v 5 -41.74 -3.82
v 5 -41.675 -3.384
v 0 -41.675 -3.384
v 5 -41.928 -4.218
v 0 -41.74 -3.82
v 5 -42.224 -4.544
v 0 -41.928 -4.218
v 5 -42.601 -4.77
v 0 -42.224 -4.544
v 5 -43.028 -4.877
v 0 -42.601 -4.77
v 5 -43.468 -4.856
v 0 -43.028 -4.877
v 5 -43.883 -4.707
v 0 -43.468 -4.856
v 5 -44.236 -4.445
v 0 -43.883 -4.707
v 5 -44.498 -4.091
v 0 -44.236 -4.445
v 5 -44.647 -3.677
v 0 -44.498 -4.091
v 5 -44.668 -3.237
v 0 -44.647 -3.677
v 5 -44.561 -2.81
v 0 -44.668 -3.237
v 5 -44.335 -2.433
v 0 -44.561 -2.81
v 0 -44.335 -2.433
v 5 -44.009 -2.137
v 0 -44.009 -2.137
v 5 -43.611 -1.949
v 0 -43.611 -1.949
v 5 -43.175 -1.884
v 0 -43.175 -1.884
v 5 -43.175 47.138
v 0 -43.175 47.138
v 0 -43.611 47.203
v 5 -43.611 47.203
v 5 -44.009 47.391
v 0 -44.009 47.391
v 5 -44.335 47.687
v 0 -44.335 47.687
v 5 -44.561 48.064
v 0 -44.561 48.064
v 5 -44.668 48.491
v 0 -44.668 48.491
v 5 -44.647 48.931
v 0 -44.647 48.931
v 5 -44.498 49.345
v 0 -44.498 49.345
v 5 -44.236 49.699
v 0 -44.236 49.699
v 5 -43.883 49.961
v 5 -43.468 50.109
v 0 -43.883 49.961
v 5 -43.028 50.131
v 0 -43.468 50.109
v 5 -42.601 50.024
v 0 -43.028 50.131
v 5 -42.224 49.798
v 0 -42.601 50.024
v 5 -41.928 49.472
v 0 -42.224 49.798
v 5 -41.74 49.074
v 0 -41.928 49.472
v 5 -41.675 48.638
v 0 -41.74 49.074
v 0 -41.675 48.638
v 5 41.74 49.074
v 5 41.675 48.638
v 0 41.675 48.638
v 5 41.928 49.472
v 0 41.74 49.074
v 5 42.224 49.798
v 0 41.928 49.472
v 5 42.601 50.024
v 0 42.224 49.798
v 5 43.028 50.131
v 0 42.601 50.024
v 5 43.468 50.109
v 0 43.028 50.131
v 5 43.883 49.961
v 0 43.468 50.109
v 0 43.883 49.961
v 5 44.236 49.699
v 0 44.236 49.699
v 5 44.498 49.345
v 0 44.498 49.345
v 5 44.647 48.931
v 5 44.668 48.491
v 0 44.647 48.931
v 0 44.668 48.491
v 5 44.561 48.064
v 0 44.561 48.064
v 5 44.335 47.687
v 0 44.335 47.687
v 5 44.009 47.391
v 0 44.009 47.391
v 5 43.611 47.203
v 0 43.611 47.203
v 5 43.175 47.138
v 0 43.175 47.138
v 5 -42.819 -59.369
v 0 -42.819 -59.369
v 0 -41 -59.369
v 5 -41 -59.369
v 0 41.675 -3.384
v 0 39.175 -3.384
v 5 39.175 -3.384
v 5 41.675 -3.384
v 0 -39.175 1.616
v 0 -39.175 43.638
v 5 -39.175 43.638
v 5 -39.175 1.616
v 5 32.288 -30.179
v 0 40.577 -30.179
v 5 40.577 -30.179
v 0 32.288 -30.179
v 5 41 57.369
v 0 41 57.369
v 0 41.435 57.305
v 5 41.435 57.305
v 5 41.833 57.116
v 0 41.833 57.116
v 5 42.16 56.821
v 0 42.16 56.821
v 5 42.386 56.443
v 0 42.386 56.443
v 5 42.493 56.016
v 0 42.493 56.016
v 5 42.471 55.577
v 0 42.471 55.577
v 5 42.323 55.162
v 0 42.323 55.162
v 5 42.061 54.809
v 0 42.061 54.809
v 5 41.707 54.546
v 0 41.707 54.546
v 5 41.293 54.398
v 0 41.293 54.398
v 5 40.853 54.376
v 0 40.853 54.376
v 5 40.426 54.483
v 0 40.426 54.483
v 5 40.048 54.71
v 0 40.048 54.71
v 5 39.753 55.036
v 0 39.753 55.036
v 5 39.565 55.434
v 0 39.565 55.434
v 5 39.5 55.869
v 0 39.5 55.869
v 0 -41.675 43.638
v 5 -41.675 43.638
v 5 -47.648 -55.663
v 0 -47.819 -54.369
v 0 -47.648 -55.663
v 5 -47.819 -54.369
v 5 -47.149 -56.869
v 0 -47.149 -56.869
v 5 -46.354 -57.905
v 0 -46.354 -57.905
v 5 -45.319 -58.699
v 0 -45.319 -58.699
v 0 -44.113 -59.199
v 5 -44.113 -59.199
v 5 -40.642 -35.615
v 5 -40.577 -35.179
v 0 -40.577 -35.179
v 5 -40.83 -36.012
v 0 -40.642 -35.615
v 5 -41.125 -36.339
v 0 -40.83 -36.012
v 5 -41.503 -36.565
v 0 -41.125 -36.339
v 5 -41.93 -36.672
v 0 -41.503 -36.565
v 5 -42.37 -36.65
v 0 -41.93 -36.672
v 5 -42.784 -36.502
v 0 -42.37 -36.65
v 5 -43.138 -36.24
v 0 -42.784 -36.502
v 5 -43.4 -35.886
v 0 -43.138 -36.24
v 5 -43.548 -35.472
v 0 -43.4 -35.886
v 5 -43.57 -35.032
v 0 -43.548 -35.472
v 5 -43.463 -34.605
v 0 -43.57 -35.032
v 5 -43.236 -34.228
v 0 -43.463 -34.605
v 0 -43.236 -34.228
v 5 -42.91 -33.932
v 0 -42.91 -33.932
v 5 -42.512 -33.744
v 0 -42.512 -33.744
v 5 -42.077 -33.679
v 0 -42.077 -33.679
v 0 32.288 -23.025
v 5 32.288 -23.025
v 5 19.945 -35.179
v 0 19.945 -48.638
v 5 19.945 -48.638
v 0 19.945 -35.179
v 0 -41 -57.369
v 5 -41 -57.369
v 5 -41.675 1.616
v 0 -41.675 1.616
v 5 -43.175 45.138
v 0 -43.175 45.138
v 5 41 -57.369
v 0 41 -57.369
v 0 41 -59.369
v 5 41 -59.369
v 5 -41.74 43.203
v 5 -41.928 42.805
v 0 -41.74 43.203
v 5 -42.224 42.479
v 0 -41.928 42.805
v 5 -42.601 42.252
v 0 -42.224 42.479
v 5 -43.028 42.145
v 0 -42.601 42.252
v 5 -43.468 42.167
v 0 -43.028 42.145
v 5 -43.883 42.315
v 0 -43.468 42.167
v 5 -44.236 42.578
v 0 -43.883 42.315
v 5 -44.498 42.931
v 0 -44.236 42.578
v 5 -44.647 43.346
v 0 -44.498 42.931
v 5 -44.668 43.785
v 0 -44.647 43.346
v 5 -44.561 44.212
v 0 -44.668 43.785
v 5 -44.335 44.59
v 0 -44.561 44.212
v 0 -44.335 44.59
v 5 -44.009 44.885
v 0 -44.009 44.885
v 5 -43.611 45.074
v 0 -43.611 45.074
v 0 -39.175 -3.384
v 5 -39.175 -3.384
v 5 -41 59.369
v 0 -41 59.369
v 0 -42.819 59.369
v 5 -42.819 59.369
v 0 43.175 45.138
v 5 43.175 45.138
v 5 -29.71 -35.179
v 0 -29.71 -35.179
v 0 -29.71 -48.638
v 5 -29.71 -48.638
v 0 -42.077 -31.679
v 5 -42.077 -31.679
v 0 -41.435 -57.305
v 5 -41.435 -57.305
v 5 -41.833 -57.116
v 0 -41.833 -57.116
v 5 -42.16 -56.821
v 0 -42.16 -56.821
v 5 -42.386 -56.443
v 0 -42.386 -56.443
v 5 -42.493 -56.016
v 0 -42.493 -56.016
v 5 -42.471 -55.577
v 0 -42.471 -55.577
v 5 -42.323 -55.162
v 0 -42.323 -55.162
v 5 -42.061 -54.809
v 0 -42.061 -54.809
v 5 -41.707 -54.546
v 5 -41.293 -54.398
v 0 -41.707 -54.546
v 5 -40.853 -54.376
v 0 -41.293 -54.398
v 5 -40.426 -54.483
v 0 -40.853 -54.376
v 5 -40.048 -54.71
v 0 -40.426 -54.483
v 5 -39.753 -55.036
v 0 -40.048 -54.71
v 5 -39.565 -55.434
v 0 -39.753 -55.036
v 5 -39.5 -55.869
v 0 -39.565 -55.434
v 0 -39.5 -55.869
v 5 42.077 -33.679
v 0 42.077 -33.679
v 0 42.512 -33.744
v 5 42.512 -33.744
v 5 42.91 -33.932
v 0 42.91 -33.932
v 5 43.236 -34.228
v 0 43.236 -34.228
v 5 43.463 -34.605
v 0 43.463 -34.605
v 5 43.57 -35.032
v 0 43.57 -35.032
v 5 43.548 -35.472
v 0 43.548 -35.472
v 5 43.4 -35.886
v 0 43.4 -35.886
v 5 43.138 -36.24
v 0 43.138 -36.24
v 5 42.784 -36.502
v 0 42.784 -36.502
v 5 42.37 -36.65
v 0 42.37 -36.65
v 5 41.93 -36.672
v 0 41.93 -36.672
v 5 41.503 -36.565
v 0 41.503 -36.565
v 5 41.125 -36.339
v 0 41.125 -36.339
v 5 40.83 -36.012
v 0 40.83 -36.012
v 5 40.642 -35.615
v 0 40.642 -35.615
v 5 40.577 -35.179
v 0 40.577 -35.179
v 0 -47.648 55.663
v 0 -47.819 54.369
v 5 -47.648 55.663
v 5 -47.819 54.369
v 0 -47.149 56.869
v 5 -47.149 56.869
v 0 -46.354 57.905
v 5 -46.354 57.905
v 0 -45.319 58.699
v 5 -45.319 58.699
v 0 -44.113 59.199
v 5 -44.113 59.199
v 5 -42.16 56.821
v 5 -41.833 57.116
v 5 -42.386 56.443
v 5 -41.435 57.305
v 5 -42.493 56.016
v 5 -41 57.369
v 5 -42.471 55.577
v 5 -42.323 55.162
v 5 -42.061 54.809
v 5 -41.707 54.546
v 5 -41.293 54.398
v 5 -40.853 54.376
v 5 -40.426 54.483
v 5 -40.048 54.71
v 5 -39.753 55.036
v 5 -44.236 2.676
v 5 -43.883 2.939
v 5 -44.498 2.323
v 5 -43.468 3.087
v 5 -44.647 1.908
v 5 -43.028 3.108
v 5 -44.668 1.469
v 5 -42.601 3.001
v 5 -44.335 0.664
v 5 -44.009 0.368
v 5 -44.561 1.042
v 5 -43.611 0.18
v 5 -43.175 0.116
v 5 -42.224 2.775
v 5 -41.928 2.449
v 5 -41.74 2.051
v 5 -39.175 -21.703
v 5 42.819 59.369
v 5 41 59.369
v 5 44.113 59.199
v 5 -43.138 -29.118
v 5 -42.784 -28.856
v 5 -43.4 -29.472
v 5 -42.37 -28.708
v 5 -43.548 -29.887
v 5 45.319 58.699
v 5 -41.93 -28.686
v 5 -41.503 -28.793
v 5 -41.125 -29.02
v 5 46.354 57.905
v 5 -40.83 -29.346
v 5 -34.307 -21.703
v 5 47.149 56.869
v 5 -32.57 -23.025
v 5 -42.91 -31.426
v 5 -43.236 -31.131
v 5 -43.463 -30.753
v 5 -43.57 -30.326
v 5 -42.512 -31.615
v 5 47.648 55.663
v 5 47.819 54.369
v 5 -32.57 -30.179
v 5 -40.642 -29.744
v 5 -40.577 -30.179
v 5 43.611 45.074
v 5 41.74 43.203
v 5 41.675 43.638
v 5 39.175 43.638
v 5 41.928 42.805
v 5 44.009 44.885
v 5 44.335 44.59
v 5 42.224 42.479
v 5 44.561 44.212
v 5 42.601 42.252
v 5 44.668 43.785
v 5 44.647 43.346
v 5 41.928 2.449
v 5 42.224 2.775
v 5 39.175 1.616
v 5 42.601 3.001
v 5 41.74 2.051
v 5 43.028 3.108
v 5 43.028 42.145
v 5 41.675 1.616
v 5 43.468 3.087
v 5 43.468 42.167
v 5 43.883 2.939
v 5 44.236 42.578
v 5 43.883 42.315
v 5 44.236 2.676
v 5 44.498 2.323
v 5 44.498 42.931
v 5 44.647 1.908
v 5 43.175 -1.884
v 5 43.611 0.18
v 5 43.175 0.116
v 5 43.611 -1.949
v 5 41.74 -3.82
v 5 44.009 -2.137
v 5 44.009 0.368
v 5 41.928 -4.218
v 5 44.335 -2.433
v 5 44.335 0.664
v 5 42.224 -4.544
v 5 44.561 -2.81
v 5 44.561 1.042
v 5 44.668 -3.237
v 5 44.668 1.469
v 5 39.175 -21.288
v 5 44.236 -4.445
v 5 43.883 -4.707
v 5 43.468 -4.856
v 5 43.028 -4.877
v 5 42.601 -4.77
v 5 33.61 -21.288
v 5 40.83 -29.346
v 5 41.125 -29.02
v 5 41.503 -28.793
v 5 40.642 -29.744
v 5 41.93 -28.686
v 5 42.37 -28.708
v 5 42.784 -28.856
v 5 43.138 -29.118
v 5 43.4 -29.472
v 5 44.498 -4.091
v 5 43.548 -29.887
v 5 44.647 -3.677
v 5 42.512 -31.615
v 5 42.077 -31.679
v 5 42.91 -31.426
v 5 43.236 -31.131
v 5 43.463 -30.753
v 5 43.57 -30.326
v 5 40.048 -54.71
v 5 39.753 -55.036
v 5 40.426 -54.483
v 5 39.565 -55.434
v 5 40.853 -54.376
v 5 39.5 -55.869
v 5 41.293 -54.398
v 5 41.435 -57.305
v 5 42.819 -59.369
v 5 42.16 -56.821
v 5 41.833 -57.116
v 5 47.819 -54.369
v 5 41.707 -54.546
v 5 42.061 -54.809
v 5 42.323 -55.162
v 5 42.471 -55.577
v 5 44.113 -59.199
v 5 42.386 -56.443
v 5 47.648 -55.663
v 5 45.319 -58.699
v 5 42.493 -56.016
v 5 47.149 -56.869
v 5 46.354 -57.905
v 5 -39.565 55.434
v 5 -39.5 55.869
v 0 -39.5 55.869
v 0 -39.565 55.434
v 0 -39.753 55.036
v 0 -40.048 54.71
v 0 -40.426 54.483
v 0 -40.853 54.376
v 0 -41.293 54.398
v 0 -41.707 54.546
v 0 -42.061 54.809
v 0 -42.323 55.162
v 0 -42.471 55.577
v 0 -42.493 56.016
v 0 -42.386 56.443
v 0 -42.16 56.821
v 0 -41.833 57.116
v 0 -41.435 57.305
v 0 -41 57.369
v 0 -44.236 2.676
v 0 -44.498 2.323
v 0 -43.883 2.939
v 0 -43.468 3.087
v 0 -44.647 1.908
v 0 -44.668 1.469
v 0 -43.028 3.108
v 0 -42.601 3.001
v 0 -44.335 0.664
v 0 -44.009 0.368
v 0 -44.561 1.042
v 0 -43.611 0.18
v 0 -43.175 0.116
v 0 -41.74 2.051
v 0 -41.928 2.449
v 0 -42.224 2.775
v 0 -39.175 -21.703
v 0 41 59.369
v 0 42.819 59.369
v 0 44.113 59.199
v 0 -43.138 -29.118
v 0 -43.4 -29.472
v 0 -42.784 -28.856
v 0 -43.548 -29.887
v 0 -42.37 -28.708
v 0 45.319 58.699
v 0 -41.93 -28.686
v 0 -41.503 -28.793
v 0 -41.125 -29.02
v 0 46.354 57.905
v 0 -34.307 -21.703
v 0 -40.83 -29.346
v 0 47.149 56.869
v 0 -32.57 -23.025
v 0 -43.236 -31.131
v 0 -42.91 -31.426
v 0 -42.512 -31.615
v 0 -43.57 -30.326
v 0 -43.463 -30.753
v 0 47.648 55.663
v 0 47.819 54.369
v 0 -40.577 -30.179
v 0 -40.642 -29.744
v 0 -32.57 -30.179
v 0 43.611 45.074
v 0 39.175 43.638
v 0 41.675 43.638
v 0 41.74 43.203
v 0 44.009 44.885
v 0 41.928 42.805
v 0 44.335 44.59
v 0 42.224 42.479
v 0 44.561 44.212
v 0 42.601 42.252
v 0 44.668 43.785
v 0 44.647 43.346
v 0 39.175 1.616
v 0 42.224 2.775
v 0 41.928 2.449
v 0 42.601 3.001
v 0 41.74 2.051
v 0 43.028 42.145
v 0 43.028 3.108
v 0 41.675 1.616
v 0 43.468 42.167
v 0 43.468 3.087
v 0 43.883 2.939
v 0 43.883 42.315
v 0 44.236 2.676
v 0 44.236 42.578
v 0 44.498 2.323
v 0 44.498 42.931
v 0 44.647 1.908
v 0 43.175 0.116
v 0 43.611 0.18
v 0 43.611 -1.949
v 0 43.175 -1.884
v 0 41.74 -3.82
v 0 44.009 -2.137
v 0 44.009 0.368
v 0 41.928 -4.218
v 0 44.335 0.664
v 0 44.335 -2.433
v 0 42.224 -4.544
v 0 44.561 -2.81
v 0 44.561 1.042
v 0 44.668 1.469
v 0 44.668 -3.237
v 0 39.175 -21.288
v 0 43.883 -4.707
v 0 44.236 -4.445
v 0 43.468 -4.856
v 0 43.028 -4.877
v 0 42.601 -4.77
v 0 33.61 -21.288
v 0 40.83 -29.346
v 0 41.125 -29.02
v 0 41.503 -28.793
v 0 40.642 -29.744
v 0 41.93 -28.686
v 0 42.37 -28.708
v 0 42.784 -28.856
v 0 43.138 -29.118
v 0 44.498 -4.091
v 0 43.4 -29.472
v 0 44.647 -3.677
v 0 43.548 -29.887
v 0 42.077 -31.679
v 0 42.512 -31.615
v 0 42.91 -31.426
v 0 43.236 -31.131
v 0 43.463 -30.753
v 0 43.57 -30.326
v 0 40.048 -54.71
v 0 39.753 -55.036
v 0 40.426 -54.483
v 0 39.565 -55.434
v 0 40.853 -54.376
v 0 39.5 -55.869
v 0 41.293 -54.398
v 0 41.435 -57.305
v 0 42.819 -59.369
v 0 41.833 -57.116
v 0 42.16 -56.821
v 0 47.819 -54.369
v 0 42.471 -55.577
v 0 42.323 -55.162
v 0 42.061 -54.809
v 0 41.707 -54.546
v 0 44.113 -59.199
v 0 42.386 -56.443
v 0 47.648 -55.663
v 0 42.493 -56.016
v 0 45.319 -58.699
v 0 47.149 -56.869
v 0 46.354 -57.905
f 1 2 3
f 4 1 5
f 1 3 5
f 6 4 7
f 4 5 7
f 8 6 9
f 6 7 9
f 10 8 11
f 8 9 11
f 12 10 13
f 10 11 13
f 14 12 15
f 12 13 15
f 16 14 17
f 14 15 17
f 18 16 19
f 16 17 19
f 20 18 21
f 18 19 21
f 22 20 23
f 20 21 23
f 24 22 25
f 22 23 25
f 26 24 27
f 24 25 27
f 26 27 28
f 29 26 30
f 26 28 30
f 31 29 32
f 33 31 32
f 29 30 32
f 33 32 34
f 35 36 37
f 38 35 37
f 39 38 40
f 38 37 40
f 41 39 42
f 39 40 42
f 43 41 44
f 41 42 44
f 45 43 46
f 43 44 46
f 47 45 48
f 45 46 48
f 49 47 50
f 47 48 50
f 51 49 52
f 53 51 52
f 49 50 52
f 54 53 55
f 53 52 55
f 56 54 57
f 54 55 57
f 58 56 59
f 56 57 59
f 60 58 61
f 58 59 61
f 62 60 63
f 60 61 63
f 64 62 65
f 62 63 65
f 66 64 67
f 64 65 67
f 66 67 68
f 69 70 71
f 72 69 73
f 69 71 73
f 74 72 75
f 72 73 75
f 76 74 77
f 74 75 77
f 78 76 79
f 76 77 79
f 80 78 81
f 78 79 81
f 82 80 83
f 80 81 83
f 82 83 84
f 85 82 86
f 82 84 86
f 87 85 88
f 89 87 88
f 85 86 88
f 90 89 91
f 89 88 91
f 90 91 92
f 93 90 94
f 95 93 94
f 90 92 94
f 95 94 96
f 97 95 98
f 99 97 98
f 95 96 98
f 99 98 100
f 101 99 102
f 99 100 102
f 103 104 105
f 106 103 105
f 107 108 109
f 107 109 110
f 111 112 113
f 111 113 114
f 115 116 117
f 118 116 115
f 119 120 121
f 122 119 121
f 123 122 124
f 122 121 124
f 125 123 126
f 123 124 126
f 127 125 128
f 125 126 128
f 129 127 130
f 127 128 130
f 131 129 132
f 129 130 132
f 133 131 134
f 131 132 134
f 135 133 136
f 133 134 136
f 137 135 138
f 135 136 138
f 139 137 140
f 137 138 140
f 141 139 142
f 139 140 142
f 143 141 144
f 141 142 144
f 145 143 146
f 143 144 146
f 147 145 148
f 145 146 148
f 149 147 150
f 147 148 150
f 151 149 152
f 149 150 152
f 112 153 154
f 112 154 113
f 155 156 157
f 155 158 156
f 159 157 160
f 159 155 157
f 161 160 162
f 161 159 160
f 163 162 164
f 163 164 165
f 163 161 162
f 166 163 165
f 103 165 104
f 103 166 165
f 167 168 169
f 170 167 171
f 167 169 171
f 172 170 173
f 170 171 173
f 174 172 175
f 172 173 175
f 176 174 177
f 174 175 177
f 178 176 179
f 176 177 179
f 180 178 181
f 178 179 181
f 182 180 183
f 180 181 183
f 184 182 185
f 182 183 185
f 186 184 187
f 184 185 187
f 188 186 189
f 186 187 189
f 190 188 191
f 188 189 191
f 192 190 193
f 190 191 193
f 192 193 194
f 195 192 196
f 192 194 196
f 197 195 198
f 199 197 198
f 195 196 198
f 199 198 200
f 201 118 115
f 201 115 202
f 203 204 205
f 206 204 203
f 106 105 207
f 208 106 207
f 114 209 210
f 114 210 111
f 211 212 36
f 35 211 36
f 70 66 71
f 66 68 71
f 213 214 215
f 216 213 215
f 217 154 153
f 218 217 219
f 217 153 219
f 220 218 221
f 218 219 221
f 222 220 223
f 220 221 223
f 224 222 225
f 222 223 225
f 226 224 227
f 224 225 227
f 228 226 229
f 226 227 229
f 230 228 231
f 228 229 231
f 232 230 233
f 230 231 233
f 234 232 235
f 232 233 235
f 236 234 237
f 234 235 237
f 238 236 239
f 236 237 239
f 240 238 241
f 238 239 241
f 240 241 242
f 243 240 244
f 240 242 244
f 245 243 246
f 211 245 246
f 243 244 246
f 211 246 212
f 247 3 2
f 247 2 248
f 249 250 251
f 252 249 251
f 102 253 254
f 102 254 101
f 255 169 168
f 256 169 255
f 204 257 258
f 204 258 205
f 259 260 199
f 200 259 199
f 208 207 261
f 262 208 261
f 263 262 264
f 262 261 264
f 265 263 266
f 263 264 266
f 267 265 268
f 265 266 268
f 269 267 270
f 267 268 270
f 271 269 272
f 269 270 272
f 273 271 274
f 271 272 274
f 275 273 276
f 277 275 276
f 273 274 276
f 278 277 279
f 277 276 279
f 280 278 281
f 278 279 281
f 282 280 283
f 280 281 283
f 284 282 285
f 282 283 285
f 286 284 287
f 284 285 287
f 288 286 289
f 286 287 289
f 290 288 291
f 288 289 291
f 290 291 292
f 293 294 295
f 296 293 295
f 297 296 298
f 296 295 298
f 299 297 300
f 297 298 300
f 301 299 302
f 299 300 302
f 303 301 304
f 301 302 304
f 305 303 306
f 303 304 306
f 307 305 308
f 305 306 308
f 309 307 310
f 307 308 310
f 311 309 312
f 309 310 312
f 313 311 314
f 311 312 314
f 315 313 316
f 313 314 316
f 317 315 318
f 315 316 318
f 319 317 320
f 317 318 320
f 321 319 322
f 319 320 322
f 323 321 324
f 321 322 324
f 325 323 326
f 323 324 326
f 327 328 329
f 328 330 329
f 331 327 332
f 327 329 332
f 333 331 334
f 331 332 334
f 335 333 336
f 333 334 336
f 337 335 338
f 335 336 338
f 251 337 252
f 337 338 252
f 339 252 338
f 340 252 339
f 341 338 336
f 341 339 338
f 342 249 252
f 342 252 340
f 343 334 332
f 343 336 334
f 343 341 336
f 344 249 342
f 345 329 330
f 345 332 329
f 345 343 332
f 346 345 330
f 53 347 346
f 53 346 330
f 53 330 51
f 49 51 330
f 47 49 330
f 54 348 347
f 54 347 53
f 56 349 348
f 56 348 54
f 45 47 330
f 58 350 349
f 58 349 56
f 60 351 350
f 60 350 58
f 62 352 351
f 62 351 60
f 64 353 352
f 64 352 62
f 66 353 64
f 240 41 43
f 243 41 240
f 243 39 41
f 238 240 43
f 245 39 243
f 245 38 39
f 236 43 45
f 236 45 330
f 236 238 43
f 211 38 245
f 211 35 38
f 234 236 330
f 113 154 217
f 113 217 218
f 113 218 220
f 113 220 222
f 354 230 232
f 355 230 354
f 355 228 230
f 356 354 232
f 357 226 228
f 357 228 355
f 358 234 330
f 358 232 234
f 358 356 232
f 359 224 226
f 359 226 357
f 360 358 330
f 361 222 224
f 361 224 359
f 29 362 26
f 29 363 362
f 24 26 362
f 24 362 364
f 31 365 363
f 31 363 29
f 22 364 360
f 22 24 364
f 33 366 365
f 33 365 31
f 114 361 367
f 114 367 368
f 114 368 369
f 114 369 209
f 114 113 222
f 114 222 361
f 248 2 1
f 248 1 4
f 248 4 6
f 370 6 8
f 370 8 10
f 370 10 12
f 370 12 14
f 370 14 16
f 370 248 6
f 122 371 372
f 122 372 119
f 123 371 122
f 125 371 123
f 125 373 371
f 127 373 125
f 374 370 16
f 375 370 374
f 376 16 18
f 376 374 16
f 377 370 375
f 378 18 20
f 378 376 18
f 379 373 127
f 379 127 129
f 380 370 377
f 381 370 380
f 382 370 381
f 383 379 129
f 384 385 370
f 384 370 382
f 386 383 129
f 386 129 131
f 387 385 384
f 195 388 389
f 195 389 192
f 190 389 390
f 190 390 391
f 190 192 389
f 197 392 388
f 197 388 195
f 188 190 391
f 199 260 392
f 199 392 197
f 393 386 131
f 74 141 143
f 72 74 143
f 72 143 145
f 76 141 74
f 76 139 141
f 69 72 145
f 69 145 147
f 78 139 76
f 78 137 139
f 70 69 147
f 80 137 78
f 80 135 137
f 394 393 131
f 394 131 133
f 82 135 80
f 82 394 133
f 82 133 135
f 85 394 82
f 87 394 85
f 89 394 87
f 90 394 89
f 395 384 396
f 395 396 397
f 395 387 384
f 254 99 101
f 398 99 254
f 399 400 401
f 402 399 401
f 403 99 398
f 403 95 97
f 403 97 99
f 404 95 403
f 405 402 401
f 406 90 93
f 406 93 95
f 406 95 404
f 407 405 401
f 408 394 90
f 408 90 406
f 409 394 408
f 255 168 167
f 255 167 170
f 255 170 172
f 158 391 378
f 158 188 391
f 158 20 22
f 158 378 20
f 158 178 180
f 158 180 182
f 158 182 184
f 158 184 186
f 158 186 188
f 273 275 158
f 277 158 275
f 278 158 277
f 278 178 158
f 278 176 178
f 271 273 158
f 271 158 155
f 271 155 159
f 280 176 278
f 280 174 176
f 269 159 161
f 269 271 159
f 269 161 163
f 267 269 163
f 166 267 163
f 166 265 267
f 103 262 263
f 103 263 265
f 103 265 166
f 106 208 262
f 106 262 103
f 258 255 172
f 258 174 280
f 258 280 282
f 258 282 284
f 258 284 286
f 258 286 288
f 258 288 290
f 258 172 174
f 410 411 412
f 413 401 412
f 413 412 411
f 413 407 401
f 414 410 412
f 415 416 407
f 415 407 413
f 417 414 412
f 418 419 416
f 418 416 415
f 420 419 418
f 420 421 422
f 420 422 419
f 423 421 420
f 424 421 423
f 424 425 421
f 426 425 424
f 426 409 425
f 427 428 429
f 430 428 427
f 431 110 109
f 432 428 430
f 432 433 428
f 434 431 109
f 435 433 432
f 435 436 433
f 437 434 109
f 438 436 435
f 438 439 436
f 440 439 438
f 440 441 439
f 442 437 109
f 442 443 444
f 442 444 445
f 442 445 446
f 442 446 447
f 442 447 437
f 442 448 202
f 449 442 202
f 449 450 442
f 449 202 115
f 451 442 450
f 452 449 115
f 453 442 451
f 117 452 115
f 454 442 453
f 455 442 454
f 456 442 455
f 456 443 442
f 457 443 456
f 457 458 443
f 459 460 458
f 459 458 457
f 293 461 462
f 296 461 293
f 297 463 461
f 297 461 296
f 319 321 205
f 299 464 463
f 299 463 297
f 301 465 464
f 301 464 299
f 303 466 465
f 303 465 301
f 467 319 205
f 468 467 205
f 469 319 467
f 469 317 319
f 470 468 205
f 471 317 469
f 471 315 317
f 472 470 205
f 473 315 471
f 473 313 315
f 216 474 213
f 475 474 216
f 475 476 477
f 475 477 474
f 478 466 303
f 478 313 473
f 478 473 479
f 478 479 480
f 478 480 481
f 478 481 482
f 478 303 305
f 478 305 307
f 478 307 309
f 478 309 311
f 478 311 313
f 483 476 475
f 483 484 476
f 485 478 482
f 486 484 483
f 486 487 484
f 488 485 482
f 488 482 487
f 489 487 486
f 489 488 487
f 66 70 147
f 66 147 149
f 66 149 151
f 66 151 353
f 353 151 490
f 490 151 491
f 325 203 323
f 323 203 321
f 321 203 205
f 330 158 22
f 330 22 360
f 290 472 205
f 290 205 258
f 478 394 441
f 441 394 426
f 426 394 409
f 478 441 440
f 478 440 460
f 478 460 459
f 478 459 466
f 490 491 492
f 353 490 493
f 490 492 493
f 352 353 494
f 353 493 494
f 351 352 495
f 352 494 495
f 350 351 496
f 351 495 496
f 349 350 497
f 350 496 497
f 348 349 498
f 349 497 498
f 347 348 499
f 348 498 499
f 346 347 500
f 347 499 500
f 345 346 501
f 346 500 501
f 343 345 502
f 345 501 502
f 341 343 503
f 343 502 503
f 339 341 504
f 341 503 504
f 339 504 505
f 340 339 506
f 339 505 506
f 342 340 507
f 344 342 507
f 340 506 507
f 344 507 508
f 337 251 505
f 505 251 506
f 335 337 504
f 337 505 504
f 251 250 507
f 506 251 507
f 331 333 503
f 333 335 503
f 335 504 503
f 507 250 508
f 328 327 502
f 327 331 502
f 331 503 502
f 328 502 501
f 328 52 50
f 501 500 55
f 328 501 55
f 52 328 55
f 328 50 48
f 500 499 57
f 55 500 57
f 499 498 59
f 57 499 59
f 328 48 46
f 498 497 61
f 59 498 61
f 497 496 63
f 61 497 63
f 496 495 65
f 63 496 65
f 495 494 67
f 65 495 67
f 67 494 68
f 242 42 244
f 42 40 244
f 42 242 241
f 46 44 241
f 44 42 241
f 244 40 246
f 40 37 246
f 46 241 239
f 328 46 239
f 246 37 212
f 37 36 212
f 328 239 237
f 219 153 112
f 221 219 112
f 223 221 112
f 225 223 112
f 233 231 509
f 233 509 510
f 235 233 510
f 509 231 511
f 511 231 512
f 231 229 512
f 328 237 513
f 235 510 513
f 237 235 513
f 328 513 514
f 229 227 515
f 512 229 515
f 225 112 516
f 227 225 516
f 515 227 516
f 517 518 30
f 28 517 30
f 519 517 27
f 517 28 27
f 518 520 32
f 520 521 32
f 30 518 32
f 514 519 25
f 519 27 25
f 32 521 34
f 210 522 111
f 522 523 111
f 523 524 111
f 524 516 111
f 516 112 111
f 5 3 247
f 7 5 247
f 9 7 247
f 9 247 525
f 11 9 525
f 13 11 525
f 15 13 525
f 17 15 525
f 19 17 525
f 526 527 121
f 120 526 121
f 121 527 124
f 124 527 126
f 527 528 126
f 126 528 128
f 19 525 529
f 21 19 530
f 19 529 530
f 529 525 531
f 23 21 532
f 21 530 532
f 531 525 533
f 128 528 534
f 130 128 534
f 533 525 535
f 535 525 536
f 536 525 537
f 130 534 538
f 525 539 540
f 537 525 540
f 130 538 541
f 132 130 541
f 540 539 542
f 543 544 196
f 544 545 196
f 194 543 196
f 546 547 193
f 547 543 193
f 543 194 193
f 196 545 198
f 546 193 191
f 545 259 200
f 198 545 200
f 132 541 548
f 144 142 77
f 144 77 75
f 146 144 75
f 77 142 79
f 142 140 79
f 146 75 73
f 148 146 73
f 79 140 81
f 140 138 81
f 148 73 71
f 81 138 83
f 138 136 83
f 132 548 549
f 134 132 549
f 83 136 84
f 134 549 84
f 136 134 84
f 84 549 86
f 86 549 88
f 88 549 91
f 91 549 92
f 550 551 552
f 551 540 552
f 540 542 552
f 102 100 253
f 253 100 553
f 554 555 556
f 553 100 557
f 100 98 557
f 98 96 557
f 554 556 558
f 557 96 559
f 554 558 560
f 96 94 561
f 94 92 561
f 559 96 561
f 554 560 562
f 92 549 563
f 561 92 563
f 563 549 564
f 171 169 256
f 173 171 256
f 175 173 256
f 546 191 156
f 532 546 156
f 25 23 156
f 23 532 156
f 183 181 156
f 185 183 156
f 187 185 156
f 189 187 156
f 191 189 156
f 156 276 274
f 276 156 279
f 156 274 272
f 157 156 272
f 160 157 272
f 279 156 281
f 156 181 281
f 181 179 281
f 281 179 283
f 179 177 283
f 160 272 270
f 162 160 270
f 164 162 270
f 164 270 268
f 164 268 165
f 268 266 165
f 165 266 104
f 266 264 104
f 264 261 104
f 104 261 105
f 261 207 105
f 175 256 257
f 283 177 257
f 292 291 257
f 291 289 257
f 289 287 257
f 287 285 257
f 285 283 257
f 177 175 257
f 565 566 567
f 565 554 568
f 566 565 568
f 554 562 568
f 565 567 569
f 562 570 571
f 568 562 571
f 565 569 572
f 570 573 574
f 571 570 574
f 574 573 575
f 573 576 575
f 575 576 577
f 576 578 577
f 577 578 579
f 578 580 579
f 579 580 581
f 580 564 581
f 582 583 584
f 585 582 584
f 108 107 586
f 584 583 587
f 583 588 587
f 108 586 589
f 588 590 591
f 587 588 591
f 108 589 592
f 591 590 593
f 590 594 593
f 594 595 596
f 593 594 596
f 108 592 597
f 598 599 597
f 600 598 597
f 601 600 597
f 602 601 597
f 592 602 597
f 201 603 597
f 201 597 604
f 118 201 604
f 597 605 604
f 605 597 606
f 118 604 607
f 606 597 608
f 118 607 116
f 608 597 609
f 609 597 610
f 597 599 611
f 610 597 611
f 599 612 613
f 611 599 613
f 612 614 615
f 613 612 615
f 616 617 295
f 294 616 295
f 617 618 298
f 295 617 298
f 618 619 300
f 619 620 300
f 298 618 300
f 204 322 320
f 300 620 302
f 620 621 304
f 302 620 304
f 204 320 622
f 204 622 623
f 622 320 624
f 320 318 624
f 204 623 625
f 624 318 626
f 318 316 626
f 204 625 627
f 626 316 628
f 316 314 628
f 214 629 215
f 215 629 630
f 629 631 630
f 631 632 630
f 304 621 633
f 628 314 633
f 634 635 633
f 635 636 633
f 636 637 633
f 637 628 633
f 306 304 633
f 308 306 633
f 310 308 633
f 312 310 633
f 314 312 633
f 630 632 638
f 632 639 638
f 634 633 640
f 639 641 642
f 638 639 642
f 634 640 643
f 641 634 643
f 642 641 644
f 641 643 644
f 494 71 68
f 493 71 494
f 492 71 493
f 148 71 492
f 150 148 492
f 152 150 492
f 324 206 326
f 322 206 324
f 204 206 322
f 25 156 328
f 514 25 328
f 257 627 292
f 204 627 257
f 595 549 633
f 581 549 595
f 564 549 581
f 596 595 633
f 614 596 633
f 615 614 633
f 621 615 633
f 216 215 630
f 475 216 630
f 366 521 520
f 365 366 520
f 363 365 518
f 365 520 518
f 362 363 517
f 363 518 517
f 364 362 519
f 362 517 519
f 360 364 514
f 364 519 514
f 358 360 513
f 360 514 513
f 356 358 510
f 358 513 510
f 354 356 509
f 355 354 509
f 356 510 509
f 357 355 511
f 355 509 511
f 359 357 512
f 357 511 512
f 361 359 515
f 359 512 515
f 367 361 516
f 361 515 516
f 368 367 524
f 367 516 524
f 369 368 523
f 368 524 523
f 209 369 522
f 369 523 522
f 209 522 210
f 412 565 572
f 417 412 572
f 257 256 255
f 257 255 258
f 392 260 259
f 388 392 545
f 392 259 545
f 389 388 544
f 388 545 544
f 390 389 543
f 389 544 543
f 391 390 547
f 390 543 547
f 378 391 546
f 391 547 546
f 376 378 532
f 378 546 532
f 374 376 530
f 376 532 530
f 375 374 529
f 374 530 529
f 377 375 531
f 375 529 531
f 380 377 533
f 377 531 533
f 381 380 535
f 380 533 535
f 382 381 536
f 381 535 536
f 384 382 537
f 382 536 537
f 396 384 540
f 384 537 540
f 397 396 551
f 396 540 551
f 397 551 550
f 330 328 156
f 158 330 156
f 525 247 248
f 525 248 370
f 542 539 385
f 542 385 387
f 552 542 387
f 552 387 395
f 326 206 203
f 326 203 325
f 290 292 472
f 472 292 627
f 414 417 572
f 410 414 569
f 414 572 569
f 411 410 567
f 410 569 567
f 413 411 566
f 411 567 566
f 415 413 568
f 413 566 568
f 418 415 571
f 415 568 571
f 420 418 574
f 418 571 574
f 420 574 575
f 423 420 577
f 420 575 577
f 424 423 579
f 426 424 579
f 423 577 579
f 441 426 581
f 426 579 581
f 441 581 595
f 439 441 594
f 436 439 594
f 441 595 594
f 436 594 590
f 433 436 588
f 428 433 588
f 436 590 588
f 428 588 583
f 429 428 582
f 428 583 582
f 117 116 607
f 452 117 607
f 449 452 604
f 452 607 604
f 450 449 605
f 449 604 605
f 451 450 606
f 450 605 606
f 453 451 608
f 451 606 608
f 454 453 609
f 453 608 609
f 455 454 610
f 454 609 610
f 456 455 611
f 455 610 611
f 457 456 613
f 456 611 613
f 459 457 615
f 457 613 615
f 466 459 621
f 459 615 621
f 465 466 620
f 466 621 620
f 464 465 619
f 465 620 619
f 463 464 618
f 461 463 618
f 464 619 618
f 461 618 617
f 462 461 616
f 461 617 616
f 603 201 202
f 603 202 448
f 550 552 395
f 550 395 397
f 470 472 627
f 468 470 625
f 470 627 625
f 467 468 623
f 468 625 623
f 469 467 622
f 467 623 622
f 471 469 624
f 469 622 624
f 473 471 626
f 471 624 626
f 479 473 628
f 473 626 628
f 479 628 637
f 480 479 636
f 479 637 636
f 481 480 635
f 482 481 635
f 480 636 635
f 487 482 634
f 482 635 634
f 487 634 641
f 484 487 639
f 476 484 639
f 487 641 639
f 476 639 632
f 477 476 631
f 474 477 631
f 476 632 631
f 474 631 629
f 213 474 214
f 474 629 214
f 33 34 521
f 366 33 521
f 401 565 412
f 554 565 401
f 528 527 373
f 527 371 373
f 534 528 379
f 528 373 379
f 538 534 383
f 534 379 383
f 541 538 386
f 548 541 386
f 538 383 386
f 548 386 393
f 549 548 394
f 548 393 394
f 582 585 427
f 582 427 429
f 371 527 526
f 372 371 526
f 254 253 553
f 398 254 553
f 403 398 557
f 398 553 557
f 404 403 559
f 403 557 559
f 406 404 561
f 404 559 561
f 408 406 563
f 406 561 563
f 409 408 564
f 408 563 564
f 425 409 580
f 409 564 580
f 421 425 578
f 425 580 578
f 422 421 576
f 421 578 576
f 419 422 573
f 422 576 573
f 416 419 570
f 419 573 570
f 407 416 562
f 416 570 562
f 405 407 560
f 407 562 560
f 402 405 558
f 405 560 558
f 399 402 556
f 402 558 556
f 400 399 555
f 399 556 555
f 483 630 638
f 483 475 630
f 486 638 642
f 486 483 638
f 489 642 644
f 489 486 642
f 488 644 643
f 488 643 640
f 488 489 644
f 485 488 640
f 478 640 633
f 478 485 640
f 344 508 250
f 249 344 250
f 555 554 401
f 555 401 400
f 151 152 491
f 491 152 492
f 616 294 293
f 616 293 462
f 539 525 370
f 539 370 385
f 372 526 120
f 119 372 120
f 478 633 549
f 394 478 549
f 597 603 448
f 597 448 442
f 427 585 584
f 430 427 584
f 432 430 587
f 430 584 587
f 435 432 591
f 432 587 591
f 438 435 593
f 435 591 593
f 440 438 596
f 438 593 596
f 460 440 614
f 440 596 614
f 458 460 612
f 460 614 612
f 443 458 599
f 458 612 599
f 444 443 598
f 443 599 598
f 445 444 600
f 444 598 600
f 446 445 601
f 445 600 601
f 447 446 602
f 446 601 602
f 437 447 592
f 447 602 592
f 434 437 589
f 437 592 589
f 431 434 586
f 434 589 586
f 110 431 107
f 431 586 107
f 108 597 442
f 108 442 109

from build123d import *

# Parameters (mm, degrees)
BOSS_EXTRUDE1_DEPTH = 5
FILLET1_R           = 5
CUT_EXTRUDE1_REACH  = 7
SKETCH2_W           = 5
SKETCH2_H           = 4
CUT_EXTRUDE2_REACH  = 7
SKETCH3_R           = 1.5


with BuildPart() as part:
    # Sketch1 → Boss-Extrude1 (new body)
    with BuildSketch(Plane(origin=(0, 0, 0), x_dir=(0, 0, -1), z_dir=(1, 0, 0))):
        Polygon((-59.36916415, -47.818646587), (0, -47.818646587), (59.36916415, -47.818646587), (59.36916415, -41), (55.86916415, -41), (55.86916415, 41), (59.36916415, 41), (59.36916415, 47.818646587), (-59.36916415, 47.818646587), (-59.36916415, 41), (-55.86916415, 41), (-55.86916415, -41), (-59.36916415, -41), align=None)
        Polygon((21.702610628, -39.175443067), (21.702610628, -34.307045578), (23.024909313, -32.569779859), (30.179141539, -32.569779859), (30.179141539, -42.076978078), (35.179141539, -42.076978078), (35.179141539, -29.710380013), (48.63820865, -29.710380013), (48.63820865, 19.945173818), (35.179141539, 19.945173818), (35.179141539, 42.076978078), (30.179141539, 42.076978078), (30.179141539, 32.288188968), (23.024909313, 32.288188968), (21.287643594, 33.610487654), (21.287643594, 39.175443067), (-48.63820865, 39.175443067), (-48.63820865, -39.175443067), align=None, mode=Mode.SUBTRACT)
    extrude(amount=BOSS_EXTRUDE1_DEPTH)

    # Fillet1
    fillet1_edges = [part.edges().sort_by_distance(p)[0] for p in [
        (2.5, -47.818646587, -59.36916415),
        (2.5, -47.818646587, 59.36916415),
        (2.5, 47.818646587, 59.36916415),
        (2.5, 47.818646587, -59.36916415),
    ]]
    fillet(fillet1_edges, radius=FILLET1_R)

    # Sketch2 → Cut-Extrude1 (cut, up to next)
    with BuildSketch(Plane.ZY, mode=Mode.PRIVATE) as cut_extrude1_sk1:
        with Locations((46.13820865, 41.175443067)):
            Rectangle(SKETCH2_W, SKETCH2_H)
    cut_extrude1_tool1 = extrude(cut_extrude1_sk1.sketch, amount=-CUT_EXTRUDE1_REACH, mode=Mode.PRIVATE) & part.part
    add(cut_extrude1_tool1.solids().sort_by_distance((0, 41.175443, 46.138209))[0], mode=Mode.SUBTRACT)
    # Sketch2 → Cut-Extrude1 (cut, up to next)
    with BuildSketch(Plane.ZY, mode=Mode.PRIVATE) as cut_extrude1_sk2:
        with Locations((46.13820865, -41.175443067)):
            Rectangle(SKETCH2_W, SKETCH2_H)
    cut_extrude1_tool2 = extrude(cut_extrude1_sk2.sketch, amount=-CUT_EXTRUDE1_REACH, mode=Mode.PRIVATE) & part.part
    add(cut_extrude1_tool2.solids().sort_by_distance((0, -41.175443, 46.138209))[0], mode=Mode.SUBTRACT)
    # Sketch2 → Cut-Extrude1 (cut, up to next)
    with BuildSketch(Plane.ZY, mode=Mode.PRIVATE) as cut_extrude1_sk3:
        with Locations((-0.884341096, -41.175443067)):
            Rectangle(SKETCH2_W, SKETCH2_H)
    cut_extrude1_tool3 = extrude(cut_extrude1_sk3.sketch, amount=-CUT_EXTRUDE1_REACH, mode=Mode.PRIVATE) & part.part
    add(cut_extrude1_tool3.solids().sort_by_distance((0, -41.175443, -0.884341))[0], mode=Mode.SUBTRACT)
    # Sketch2 → Cut-Extrude1 (cut, up to next)
    with BuildSketch(Plane.ZY, mode=Mode.PRIVATE) as cut_extrude1_sk4:
        with Locations((-0.884341096, 41.175443067)):
            Rectangle(SKETCH2_W, SKETCH2_H)
    cut_extrude1_tool4 = extrude(cut_extrude1_sk4.sketch, amount=-CUT_EXTRUDE1_REACH, mode=Mode.PRIVATE) & part.part
    add(cut_extrude1_tool4.solids().sort_by_distance((0, 41.175443, -0.884341))[0], mode=Mode.SUBTRACT)

    # Sketch3 → Cut-Extrude2 (cut, up to next)
    with BuildSketch(Plane.ZY, mode=Mode.PRIVATE) as cut_extrude2_sk1:
        with Locations((-35.179141539, 42.076978078)):
            Circle(SKETCH3_R)
    cut_extrude2_tool1 = extrude(cut_extrude2_sk1.sketch, amount=-CUT_EXTRUDE2_REACH, mode=Mode.PRIVATE) & part.part
    add(cut_extrude2_tool1.solids().sort_by_distance((0, 42.076978, -35.179142))[0], mode=Mode.SUBTRACT)
    # Sketch3 → Cut-Extrude2 (cut, up to next)
    with BuildSketch(Plane.ZY, mode=Mode.PRIVATE) as cut_extrude2_sk2:
        with Locations((-30.179141539, 42.076978078)):
            Circle(SKETCH3_R)
    cut_extrude2_tool2 = extrude(cut_extrude2_sk2.sketch, amount=-CUT_EXTRUDE2_REACH, mode=Mode.PRIVATE) & part.part
    add(cut_extrude2_tool2.solids().sort_by_distance((0, 42.076978, -30.179142))[0], mode=Mode.SUBTRACT)
    # Sketch3 → Cut-Extrude2 (cut, up to next)
    with BuildSketch(Plane.ZY, mode=Mode.PRIVATE) as cut_extrude2_sk3:
        with Locations((-3.384341096, 43.175443067)):
            Circle(SKETCH3_R)
    cut_extrude2_tool3 = extrude(cut_extrude2_sk3.sketch, amount=-CUT_EXTRUDE2_REACH, mode=Mode.PRIVATE) & part.part
    add(cut_extrude2_tool3.solids().sort_by_distance((0, 43.175443, -3.384341))[0], mode=Mode.SUBTRACT)
    # Sketch3 → Cut-Extrude2 (cut, up to next)
    with BuildSketch(Plane.ZY, mode=Mode.PRIVATE) as cut_extrude2_sk4:
        with Locations((1.615658904, 43.175443067)):
            Circle(SKETCH3_R)
    cut_extrude2_tool4 = extrude(cut_extrude2_sk4.sketch, amount=-CUT_EXTRUDE2_REACH, mode=Mode.PRIVATE) & part.part
    add(cut_extrude2_tool4.solids().sort_by_distance((0, 43.175443, 1.615659))[0], mode=Mode.SUBTRACT)
    # Sketch3 → Cut-Extrude2 (cut, up to next)
    with BuildSketch(Plane.ZY, mode=Mode.PRIVATE) as cut_extrude2_sk5:
        with Locations((-55.86916415, 41)):
            Circle(SKETCH3_R)
    cut_extrude2_tool5 = extrude(cut_extrude2_sk5.sketch, amount=-CUT_EXTRUDE2_REACH, mode=Mode.PRIVATE) & part.part
    add(cut_extrude2_tool5.solids().sort_by_distance((0, 41, -55.869164))[0], mode=Mode.SUBTRACT)
    # Sketch3 → Cut-Extrude2 (cut, up to next)
    with BuildSketch(Plane.ZY, mode=Mode.PRIVATE) as cut_extrude2_sk6:
        with Locations((43.63820865, 43.175443067)):
            Circle(SKETCH3_R)
    cut_extrude2_tool6 = extrude(cut_extrude2_sk6.sketch, amount=-CUT_EXTRUDE2_REACH, mode=Mode.PRIVATE) & part.part
    add(cut_extrude2_tool6.solids().sort_by_distance((0, 43.175443, 43.638209))[0], mode=Mode.SUBTRACT)
    # Sketch3 → Cut-Extrude2 (cut, up to next)
    with BuildSketch(Plane.ZY, mode=Mode.PRIVATE) as cut_extrude2_sk7:
        with Locations((48.63820865, 43.175443067)):
            Circle(SKETCH3_R)
    cut_extrude2_tool7 = extrude(cut_extrude2_sk7.sketch, amount=-CUT_EXTRUDE2_REACH, mode=Mode.PRIVATE) & part.part
    add(cut_extrude2_tool7.solids().sort_by_distance((0, 43.175443, 48.638209))[0], mode=Mode.SUBTRACT)
    # Sketch3 → Cut-Extrude2 (cut, up to next)
    with BuildSketch(Plane.ZY, mode=Mode.PRIVATE) as cut_extrude2_sk8:
        with Locations((48.63820865, -43.175443067)):
            Circle(SKETCH3_R)
    cut_extrude2_tool8 = extrude(cut_extrude2_sk8.sketch, amount=-CUT_EXTRUDE2_REACH, mode=Mode.PRIVATE) & part.part
    add(cut_extrude2_tool8.solids().sort_by_distance((0, -43.175443, 48.638209))[0], mode=Mode.SUBTRACT)
    # Sketch3 → Cut-Extrude2 (cut, up to next)
    with BuildSketch(Plane.ZY, mode=Mode.PRIVATE) as cut_extrude2_sk9:
        with Locations((43.63820865, -43.175443067)):
            Circle(SKETCH3_R)
    cut_extrude2_tool9 = extrude(cut_extrude2_sk9.sketch, amount=-CUT_EXTRUDE2_REACH, mode=Mode.PRIVATE) & part.part
    add(cut_extrude2_tool9.solids().sort_by_distance((0, -43.175443, 43.638209))[0], mode=Mode.SUBTRACT)
    # Sketch3 → Cut-Extrude2 (cut, up to next)
    with BuildSketch(Plane.ZY, mode=Mode.PRIVATE) as cut_extrude2_sk10:
        with Locations((1.615658904, -43.175443067)):
            Circle(SKETCH3_R)
    cut_extrude2_tool10 = extrude(cut_extrude2_sk10.sketch, amount=-CUT_EXTRUDE2_REACH, mode=Mode.PRIVATE) & part.part
    add(cut_extrude2_tool10.solids().sort_by_distance((0, -43.175443, 1.615659))[0], mode=Mode.SUBTRACT)
    # Sketch3 → Cut-Extrude2 (cut, up to next)
    with BuildSketch(Plane.ZY, mode=Mode.PRIVATE) as cut_extrude2_sk11:
        with Locations((-3.384341096, -43.175443067)):
            Circle(SKETCH3_R)
    cut_extrude2_tool11 = extrude(cut_extrude2_sk11.sketch, amount=-CUT_EXTRUDE2_REACH, mode=Mode.PRIVATE) & part.part
    add(cut_extrude2_tool11.solids().sort_by_distance((0, -43.175443, -3.384341))[0], mode=Mode.SUBTRACT)
    # Sketch3 → Cut-Extrude2 (cut, up to next)
    with BuildSketch(Plane.ZY, mode=Mode.PRIVATE) as cut_extrude2_sk12:
        with Locations((-30.179141539, -42.076978078)):
            Circle(SKETCH3_R)
    cut_extrude2_tool12 = extrude(cut_extrude2_sk12.sketch, amount=-CUT_EXTRUDE2_REACH, mode=Mode.PRIVATE) & part.part
    add(cut_extrude2_tool12.solids().sort_by_distance((0, -42.076978, -30.179142))[0], mode=Mode.SUBTRACT)
    # Sketch3 → Cut-Extrude2 (cut, up to next)
    with BuildSketch(Plane.ZY, mode=Mode.PRIVATE) as cut_extrude2_sk13:
        with Locations((-35.179141539, -42.076978078)):
            Circle(SKETCH3_R)
    cut_extrude2_tool13 = extrude(cut_extrude2_sk13.sketch, amount=-CUT_EXTRUDE2_REACH, mode=Mode.PRIVATE) & part.part
    add(cut_extrude2_tool13.solids().sort_by_distance((0, -42.076978, -35.179142))[0], mode=Mode.SUBTRACT)
    # Sketch3 → Cut-Extrude2 (cut, up to next)
    with BuildSketch(Plane.ZY, mode=Mode.PRIVATE) as cut_extrude2_sk14:
        with Locations((-55.86916415, -41)):
            Circle(SKETCH3_R)
    cut_extrude2_tool14 = extrude(cut_extrude2_sk14.sketch, amount=-CUT_EXTRUDE2_REACH, mode=Mode.PRIVATE) & part.part
    add(cut_extrude2_tool14.solids().sort_by_distance((0, -41, -55.869164))[0], mode=Mode.SUBTRACT)
    # Sketch3 → Cut-Extrude2 (cut, up to next)
    with BuildSketch(Plane.ZY, mode=Mode.PRIVATE) as cut_extrude2_sk15:
        with Locations((55.86916415, -41)):
            Circle(SKETCH3_R)
    cut_extrude2_tool15 = extrude(cut_extrude2_sk15.sketch, amount=-CUT_EXTRUDE2_REACH, mode=Mode.PRIVATE) & part.part
    add(cut_extrude2_tool15.solids().sort_by_distance((0, -41, 55.869164))[0], mode=Mode.SUBTRACT)
    # Sketch3 → Cut-Extrude2 (cut, up to next)
    with BuildSketch(Plane.ZY, mode=Mode.PRIVATE) as cut_extrude2_sk16:
        with Locations((55.86916415, 41)):
            Circle(SKETCH3_R)
    cut_extrude2_tool16 = extrude(cut_extrude2_sk16.sketch, amount=-CUT_EXTRUDE2_REACH, mode=Mode.PRIVATE) & part.part
    add(cut_extrude2_tool16.solids().sort_by_distance((0, 41, 55.869164))[0], mode=Mode.SUBTRACT)


solid = part.part
